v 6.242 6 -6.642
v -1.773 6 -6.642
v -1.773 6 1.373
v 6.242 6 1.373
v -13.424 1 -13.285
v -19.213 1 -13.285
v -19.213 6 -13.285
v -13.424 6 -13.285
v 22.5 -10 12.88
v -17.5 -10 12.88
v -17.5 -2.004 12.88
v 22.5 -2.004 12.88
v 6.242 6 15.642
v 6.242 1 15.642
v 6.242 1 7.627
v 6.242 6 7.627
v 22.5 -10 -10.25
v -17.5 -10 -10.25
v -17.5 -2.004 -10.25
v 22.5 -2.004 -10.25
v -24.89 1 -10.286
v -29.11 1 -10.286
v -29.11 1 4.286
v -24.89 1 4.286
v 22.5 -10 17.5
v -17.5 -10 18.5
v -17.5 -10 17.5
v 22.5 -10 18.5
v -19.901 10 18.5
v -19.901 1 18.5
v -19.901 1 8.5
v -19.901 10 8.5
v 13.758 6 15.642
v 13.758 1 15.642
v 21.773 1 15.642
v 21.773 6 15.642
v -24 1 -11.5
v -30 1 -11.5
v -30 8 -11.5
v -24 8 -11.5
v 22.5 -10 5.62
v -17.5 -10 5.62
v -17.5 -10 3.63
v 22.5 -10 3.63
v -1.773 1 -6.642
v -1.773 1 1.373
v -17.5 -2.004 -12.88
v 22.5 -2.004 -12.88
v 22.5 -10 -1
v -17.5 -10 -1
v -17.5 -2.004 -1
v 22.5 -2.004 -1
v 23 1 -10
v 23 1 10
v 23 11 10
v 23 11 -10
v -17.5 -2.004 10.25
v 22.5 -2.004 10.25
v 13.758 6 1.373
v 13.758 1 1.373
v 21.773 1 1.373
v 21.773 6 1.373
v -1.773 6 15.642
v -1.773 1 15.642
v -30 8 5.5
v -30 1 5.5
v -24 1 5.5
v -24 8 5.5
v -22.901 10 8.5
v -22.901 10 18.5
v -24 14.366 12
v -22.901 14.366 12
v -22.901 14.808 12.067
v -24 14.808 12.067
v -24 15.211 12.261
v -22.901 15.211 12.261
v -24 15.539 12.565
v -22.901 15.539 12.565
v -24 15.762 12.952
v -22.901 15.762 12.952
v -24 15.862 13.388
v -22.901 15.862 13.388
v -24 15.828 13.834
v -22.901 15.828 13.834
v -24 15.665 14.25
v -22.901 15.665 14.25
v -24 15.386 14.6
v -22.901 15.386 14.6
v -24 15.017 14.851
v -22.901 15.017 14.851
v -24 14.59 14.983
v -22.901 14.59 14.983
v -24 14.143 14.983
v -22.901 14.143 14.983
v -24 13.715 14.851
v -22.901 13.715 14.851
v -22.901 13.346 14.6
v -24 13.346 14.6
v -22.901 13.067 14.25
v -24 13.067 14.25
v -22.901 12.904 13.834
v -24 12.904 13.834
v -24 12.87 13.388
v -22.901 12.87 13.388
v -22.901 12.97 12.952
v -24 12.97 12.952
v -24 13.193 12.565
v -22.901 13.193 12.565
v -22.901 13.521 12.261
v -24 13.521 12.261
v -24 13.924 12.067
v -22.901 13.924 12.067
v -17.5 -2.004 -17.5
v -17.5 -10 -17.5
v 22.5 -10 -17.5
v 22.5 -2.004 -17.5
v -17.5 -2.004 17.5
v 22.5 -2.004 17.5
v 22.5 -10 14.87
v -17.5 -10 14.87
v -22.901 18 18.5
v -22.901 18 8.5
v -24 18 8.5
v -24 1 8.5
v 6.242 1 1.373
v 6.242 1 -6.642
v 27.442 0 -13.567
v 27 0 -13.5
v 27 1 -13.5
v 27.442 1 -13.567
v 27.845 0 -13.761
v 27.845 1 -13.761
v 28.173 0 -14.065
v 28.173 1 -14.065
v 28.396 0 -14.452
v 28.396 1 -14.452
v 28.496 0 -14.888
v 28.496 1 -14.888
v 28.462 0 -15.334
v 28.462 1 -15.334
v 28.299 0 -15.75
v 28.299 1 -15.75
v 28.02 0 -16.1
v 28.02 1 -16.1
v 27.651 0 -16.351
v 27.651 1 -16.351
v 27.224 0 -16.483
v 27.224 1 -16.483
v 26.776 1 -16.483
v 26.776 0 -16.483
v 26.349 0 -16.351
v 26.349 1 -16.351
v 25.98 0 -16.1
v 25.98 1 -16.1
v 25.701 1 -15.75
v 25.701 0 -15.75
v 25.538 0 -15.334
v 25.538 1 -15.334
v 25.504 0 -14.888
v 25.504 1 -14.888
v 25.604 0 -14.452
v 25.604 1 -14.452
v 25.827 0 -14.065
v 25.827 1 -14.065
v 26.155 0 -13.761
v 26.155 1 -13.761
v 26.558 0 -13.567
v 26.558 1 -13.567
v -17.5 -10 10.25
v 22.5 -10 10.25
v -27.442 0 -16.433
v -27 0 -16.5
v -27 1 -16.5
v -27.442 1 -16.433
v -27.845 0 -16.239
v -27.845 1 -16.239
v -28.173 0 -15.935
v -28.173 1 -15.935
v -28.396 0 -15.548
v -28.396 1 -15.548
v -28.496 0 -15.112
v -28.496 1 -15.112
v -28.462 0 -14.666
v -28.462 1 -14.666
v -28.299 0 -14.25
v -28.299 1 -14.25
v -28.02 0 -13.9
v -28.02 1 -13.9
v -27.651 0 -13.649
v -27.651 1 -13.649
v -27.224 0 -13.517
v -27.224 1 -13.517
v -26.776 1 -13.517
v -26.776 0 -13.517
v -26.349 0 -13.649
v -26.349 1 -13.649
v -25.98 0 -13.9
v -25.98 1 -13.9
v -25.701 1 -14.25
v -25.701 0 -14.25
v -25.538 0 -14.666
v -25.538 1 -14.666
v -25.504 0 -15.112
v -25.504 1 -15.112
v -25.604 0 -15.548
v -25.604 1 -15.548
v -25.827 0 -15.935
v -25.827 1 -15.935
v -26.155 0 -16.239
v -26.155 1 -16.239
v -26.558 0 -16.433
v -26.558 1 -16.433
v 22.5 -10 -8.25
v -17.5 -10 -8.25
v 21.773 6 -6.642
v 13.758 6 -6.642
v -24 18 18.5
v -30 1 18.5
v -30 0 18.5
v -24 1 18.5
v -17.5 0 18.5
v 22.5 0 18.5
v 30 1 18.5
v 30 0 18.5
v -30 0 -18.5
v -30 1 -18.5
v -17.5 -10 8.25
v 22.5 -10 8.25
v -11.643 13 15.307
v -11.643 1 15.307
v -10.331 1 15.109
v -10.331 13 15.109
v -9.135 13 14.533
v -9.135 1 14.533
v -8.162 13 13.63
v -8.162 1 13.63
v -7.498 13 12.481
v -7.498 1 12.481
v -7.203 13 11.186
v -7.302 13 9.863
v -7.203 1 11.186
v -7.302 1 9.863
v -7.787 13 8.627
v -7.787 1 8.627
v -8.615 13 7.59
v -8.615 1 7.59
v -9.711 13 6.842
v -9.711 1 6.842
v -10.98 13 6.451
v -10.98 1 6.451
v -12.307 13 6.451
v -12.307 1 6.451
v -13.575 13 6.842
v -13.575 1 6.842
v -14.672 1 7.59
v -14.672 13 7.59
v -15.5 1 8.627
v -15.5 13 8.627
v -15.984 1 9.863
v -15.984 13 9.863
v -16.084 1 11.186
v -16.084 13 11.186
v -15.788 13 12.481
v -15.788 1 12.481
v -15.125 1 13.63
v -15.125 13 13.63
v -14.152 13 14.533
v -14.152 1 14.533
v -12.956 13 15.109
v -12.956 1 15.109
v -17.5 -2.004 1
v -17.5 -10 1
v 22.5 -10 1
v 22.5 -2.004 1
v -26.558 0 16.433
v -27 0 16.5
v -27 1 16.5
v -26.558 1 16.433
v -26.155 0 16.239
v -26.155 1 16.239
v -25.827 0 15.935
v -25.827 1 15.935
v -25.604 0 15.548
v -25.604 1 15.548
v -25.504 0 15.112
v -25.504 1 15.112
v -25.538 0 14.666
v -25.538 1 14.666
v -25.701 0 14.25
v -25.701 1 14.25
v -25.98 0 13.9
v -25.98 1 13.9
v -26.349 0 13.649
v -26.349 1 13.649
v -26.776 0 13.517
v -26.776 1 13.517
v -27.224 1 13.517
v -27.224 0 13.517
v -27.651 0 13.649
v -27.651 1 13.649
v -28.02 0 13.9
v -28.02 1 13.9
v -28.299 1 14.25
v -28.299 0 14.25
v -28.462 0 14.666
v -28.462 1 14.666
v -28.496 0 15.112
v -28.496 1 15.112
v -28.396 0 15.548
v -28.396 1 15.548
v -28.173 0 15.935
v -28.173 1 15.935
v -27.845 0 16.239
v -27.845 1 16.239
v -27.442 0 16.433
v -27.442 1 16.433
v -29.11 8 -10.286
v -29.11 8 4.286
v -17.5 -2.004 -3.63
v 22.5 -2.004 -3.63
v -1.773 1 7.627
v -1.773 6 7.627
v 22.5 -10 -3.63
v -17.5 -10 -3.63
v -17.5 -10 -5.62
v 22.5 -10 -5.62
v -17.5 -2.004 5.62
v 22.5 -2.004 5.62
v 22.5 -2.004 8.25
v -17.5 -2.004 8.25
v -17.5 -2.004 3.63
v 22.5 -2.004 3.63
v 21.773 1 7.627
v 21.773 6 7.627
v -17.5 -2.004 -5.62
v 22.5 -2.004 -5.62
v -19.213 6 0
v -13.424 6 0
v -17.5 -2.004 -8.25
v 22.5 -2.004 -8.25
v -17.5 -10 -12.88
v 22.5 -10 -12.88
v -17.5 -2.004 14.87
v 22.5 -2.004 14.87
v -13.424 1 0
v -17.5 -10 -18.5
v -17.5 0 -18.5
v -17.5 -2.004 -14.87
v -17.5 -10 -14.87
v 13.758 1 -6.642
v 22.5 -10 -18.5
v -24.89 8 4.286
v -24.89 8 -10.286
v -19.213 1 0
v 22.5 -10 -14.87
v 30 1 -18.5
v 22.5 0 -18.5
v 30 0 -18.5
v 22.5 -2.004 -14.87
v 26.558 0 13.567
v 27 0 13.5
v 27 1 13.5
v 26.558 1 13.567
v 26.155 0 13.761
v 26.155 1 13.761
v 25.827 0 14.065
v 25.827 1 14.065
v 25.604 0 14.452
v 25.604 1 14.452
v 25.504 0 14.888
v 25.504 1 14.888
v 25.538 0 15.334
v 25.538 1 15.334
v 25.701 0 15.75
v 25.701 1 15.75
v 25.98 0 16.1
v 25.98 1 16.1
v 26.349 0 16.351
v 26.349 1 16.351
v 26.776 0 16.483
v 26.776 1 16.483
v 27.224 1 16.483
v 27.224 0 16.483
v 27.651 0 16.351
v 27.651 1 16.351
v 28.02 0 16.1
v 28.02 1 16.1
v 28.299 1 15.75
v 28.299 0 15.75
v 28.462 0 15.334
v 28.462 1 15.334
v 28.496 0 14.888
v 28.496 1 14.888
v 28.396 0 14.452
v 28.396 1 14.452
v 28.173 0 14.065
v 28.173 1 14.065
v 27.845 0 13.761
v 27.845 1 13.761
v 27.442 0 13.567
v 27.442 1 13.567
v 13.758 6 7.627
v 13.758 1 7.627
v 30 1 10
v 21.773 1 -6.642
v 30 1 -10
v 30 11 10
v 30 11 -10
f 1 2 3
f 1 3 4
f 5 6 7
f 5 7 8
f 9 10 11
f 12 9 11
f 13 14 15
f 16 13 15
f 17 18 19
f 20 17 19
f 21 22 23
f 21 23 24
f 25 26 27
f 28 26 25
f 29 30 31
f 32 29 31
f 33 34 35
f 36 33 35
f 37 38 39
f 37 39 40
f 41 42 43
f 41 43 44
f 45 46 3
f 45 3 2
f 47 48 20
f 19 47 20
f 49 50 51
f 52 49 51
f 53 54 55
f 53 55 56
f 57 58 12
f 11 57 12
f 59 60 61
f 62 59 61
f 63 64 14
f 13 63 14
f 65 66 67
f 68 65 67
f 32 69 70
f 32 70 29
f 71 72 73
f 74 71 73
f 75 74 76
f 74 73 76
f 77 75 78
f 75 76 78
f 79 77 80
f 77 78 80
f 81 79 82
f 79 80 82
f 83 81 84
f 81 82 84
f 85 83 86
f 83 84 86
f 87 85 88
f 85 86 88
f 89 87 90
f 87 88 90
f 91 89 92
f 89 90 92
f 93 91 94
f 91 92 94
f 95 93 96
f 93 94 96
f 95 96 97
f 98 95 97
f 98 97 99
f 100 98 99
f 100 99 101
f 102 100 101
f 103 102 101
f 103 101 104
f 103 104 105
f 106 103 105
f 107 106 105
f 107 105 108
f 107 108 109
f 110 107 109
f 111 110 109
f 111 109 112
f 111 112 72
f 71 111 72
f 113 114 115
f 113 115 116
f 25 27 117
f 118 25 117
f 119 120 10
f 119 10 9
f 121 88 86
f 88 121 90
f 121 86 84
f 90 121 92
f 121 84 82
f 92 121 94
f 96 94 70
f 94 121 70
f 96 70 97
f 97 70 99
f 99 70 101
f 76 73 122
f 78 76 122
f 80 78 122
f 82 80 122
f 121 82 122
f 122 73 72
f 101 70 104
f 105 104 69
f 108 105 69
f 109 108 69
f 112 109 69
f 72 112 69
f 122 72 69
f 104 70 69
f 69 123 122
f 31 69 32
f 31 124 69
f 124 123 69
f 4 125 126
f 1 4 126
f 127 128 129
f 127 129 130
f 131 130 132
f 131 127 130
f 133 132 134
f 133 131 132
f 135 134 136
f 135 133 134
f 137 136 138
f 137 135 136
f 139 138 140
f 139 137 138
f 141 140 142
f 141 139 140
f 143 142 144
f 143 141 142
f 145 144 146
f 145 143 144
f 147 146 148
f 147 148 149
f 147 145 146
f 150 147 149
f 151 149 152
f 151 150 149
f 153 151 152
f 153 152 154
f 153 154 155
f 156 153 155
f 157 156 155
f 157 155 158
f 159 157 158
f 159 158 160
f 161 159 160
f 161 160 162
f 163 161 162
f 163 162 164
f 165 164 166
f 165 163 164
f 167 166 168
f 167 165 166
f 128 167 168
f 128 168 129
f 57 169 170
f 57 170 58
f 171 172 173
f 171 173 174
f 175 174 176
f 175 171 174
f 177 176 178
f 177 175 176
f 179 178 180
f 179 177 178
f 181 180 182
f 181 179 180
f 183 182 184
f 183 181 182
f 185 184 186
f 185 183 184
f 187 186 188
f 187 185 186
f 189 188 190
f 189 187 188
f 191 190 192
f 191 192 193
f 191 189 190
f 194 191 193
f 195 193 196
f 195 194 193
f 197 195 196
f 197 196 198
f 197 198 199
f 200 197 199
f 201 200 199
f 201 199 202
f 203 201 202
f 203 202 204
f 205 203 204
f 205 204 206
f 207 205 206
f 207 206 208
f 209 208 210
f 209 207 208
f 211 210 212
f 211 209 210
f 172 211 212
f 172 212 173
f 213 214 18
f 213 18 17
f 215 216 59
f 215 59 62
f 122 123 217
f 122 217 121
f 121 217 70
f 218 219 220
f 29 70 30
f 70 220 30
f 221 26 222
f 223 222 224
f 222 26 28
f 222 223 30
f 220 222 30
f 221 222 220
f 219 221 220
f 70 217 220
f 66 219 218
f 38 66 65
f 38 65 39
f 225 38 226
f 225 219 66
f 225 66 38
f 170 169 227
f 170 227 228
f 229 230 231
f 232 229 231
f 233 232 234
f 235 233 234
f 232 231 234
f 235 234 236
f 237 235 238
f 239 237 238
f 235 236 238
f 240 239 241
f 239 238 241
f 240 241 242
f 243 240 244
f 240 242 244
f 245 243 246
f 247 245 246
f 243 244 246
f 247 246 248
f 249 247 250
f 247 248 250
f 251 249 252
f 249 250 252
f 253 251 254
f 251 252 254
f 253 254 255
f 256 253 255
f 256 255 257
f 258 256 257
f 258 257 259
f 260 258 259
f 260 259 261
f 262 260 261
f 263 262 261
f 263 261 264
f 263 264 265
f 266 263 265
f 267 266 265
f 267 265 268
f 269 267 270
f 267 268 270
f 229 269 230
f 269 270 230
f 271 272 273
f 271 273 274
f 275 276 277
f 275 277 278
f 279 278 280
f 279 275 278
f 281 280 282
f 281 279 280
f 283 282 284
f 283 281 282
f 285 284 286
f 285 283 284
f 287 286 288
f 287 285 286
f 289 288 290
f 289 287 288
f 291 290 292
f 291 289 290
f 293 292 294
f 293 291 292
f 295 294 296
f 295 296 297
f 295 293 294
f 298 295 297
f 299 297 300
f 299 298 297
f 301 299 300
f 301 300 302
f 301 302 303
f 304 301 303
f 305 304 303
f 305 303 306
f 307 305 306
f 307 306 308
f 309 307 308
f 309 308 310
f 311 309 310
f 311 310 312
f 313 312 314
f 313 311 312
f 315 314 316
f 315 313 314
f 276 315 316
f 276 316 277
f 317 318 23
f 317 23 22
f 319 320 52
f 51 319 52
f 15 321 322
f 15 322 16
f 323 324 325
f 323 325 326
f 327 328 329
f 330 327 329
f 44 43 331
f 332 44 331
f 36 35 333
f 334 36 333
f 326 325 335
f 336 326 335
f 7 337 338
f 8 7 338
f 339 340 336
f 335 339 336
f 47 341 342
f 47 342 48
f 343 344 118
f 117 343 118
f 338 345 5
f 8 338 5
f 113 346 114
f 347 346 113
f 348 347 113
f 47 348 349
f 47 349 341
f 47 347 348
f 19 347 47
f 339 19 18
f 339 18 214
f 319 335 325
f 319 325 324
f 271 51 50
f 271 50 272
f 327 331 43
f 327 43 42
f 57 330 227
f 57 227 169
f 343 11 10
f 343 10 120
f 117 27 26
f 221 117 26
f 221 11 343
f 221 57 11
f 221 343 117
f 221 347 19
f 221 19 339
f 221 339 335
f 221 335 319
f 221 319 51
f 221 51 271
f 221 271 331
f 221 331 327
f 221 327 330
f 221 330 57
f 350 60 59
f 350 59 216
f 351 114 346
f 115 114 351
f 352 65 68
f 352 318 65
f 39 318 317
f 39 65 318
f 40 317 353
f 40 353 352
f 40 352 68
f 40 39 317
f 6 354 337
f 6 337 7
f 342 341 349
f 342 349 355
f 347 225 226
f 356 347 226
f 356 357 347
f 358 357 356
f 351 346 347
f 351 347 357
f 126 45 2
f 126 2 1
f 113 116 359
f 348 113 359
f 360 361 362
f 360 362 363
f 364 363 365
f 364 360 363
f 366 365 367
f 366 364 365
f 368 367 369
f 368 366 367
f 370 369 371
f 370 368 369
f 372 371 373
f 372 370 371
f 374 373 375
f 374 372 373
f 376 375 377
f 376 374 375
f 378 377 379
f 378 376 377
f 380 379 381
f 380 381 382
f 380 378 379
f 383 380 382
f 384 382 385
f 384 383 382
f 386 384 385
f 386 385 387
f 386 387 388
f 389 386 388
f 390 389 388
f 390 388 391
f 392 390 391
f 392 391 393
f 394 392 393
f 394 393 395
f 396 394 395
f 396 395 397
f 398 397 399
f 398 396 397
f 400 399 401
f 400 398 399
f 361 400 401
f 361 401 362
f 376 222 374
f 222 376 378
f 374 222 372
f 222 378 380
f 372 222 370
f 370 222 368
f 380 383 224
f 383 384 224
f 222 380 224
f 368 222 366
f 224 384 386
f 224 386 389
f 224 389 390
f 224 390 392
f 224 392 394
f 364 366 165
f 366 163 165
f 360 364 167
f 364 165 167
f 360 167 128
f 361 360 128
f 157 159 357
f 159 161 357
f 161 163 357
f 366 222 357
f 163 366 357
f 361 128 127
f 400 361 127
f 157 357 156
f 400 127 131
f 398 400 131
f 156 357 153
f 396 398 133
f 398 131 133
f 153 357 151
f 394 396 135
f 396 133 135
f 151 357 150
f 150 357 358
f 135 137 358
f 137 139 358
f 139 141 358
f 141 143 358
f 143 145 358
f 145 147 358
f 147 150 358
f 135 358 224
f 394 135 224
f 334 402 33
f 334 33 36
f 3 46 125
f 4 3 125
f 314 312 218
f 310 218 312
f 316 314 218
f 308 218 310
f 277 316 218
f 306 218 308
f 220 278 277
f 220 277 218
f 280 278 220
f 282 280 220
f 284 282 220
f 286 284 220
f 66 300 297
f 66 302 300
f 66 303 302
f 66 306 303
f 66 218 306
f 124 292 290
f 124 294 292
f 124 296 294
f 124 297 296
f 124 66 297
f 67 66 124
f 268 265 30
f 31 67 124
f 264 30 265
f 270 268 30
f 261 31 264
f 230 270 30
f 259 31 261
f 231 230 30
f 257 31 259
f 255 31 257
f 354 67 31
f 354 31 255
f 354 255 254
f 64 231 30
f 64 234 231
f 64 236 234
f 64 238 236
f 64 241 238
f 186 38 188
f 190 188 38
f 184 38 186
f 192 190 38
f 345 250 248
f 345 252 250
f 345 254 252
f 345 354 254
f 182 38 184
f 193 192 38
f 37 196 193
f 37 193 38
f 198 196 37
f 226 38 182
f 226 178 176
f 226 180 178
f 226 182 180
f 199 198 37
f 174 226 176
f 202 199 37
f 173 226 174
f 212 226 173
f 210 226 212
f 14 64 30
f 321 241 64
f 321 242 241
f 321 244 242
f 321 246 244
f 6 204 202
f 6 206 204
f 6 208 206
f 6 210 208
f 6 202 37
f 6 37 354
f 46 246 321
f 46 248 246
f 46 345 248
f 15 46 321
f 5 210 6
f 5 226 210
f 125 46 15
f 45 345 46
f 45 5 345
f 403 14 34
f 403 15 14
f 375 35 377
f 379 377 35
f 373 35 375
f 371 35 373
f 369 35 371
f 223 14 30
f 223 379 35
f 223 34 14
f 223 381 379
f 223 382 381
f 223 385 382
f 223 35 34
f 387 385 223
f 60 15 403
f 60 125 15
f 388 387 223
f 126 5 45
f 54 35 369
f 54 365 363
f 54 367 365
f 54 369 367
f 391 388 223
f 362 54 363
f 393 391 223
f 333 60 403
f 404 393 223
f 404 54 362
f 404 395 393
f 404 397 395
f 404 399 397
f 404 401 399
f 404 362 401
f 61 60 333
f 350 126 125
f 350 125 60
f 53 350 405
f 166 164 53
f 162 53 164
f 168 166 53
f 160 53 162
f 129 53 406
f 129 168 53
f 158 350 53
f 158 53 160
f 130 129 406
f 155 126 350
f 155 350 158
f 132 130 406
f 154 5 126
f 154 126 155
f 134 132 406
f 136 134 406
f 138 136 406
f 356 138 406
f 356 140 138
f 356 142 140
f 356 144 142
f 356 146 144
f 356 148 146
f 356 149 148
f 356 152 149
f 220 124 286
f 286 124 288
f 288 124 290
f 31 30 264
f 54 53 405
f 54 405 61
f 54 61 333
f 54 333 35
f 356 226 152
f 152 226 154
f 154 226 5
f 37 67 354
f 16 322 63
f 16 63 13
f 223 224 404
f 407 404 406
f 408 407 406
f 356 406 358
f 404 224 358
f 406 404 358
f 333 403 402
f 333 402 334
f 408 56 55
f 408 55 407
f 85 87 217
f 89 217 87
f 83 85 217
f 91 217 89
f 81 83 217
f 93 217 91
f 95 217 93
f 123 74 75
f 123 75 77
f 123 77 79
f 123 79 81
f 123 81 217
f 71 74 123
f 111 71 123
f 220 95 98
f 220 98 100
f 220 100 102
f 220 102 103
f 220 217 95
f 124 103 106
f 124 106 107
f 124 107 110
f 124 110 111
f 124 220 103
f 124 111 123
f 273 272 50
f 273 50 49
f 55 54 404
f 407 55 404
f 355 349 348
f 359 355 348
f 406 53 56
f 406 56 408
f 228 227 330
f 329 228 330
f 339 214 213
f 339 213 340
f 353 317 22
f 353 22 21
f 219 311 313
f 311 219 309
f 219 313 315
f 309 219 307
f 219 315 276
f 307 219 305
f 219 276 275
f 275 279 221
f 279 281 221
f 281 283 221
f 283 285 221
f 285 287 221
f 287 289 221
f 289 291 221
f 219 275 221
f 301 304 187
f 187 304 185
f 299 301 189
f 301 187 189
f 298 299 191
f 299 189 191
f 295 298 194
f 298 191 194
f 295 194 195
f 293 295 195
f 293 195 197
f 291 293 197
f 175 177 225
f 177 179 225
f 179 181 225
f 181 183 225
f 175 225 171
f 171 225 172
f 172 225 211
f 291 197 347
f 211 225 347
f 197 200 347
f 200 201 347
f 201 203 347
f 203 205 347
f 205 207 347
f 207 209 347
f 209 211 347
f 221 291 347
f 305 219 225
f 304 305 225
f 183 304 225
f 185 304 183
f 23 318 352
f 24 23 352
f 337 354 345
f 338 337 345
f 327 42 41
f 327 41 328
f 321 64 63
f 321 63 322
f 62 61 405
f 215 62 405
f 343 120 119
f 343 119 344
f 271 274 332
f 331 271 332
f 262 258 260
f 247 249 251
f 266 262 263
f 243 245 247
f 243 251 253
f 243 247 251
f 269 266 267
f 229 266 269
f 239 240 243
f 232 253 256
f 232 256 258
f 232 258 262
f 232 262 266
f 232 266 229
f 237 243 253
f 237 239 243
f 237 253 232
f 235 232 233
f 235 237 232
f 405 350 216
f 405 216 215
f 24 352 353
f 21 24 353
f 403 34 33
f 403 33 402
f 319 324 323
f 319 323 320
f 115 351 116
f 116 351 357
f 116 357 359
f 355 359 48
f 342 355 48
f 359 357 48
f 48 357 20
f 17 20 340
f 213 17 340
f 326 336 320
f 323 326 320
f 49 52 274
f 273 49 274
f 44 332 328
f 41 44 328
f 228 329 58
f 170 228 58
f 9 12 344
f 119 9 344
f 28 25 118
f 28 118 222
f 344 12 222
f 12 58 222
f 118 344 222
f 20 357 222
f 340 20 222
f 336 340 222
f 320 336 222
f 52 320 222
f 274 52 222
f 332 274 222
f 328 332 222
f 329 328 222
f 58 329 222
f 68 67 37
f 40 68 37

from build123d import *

# Parameters (mm, degrees)
SKETCH_1_W          = 60
SKETCH_1_H          = 37
SKETCH_1_R          = 1.5
EXTRUDE_1_DEPTH     = 1
SKETCH_2_W          = 18
SKETCH_2_H          = 20
EXTRUDE_2_DEPTH     = 10
SKETCH_3_R          = 1
CUT_EXTRUDE_1_DEPTH = 1
SKETCH_4_W          = 1.889309118
SKETCH_4_H          = 3.828785833
CUT_EXTRUDE_2_DEPTH = 5
SKETCH_5_W          = 6
SKETCH_5_H          = 17
EXTRUDE_3_DEPTH     = 7
SKETCH_6_W          = 4.219200818
SKETCH_6_H          = 14.571651166
CUT_EXTRUDE_3_DEPTH = 7
SKETCH_7_W          = 1.099481737
SKETCH_7_H          = 10
EXTRUDE_4_DEPTH     = 17
SKETCH_8_W          = 3
SKETCH_8_H          = 10
EXTRUDE_5_DEPTH     = 9
SKETCH_9_R          = 1.5
CUT_EXTRUDE_4_DEPTH = 9
SKETCH_10_W         = 8.015050441
SKETCH_10_H         = 8.015050442
SKETCH_10_W_2       = 5.788647541
SKETCH_10_H_2       = 13.284723362
EXTRUDE_7_DEPTH     = 5
SKETCH_11_R         = 4.452805801
EXTRUDE_8_DEPTH     = 12
SKETCH_12_W         = 40
SKETCH_12_H         = 37
EXTRUDE_9_DEPTH     = 10
SKETCH_13_W         = 2.63
SKETCH_13_H         = 7.995738943
CUT_EXTRUDE_5_DEPTH = 64.941379403
SKETCH_14_W         = 11
SKETCH_14_H         = 20
CUT_EXTRUDE_6_DEPTH = 49.448426187


with BuildPart() as part:
    # 草图1 → 凸台-拉伸1 (new body)
    with BuildSketch(Plane(origin=(0, 0, 0), x_dir=(1, 0, 0), z_dir=(0, 1, 0))):
        Rectangle(SKETCH_1_W, SKETCH_1_H)
        with Locations(Location((27, 15, 0), (0, 0, 270))):
            Circle(SKETCH_1_R, mode=Mode.SUBTRACT)
        with Locations(Location((27, -15, 0), (0, 0, 90))):
            Circle(SKETCH_1_R, mode=Mode.SUBTRACT)
        with Locations(Location((-27, -15, 0), (0, 0, 270))):
            Circle(SKETCH_1_R, mode=Mode.SUBTRACT)
        with Locations(Location((-27, 15, 0), (0, 0, 90))):
            Circle(SKETCH_1_R, mode=Mode.SUBTRACT)
    extrude(amount=EXTRUDE_1_DEPTH)

    # 草图2 → 凸台-拉伸2 (add)
    with BuildSketch(Plane(origin=(0, 1, 0), x_dir=(1, 0, 0), z_dir=(0, 1, 0))):
        with Locations((32, 0)):
            Rectangle(SKETCH_2_W, SKETCH_2_H)
    extrude(amount=EXTRUDE_2_DEPTH)

    # 草图3 → 切除-拉伸1 (cut)
    with BuildSketch(Plane(origin=(0, 11, 0), x_dir=(1, 0, 0), z_dir=(0, 1, 0))):
        with Locations(Location((38.562083072, 7.5, 0), (0, 0, 270))):
            Circle(SKETCH_3_R)
        with Locations(Location((38.562083072, 2.5, 0), (0, 0, 270))):
            Circle(SKETCH_3_R)
        with Locations(Location((38.562083072, -7.5, 0), (0, 0, 90))):
            Circle(SKETCH_3_R)
        with Locations(Location((38.562083072, -2.5, 0), (0, 0, 90))):
            Circle(SKETCH_3_R)
    extrude(amount=-CUT_EXTRUDE_1_DEPTH, mode=Mode.SUBTRACT)

    # 草图4 → 切除-拉伸2 (cut)
    with BuildSketch(Plane(origin=(41, 0, 0), x_dir=(0, 0, -1), z_dir=(1, 0, 0))):
        with Locations((-2.5, 3.73063685)):
            Rectangle(SKETCH_4_W, SKETCH_4_H)
        with Locations((-7.5, 3.73063685)):
            Rectangle(SKETCH_4_W, SKETCH_4_H)
        with Locations((2.5, 3.73063685)):
            Rectangle(SKETCH_4_W, SKETCH_4_H)
        with Locations((7.5, 3.73063685)):
            Rectangle(SKETCH_4_W, SKETCH_4_H)
    extrude(amount=-CUT_EXTRUDE_2_DEPTH, mode=Mode.SUBTRACT)

    # 草图5 → 凸台-拉伸3 (add)
    with BuildSketch(Plane(origin=(0, 1, 0), x_dir=(1, 0, 0), z_dir=(0, 1, 0))):
        with Locations((-27, 3)):
            Rectangle(SKETCH_5_W, SKETCH_5_H)
    extrude(amount=EXTRUDE_3_DEPTH)

    # 草图6 → 切除-拉伸3 (cut)
    with BuildSketch(Plane(origin=(0, 8, 0), x_dir=(1, 0, 0), z_dir=(0, 1, 0))):
        with Locations((-27, 3)):
            Rectangle(SKETCH_6_W, SKETCH_6_H)
    extrude(amount=-CUT_EXTRUDE_3_DEPTH, mode=Mode.SUBTRACT)

    # 草图7 → 凸台-拉伸4 (add)
    with BuildSketch(Plane(origin=(0, 1, 0), x_dir=(1, 0, 0), z_dir=(0, 1, 0))):
        with Locations((-23.450259132, -13.5)):
            Rectangle(SKETCH_7_W, SKETCH_7_H)
    extrude(amount=EXTRUDE_4_DEPTH)

    # 草图8 → 凸台-拉伸5 (add)
    with BuildSketch(Plane(origin=(0, 1, 0), x_dir=(1, 0, 0), z_dir=(0, 1, 0))):
        with Locations((-21.400518263, -13.5)):
            Rectangle(SKETCH_8_W, SKETCH_8_H)
    extrude(amount=EXTRUDE_5_DEPTH)

    # 草图9 → 切除-拉伸4 (cut)
    with BuildSketch(Plane(origin=(-22.900518263, 0, 0), x_dir=(0, 0, -1), z_dir=(1, 0, 0))):
        with Locations((-13.5, 14.366101357)):
            Circle(SKETCH_9_R)
    extrude(amount=-CUT_EXTRUDE_4_DEPTH, mode=Mode.SUBTRACT)

    # 草图10 → 凸台-拉伸7 (add)
    with BuildSketch(Plane(origin=(0, 1, 0), x_dir=(1, 0, 0), z_dir=(0, 1, 0))):
        with Locations((2.23408969, 2.63483646)):
            Rectangle(SKETCH_10_W, SKETCH_10_H)
        with Locations((-16.318748425, 6.642361681)):
            Rectangle(SKETCH_10_W_2, SKETCH_10_H_2)
        with Locations((17.76591031, 2.63483646)):
            Rectangle(SKETCH_10_W, SKETCH_10_H)
        with Locations((17.76591031, -11.63483646)):
            Rectangle(SKETCH_10_W, SKETCH_10_H)
        with Locations((2.23408969, -11.63483646)):
            Rectangle(SKETCH_10_W, SKETCH_10_H)
    extrude(amount=EXTRUDE_7_DEPTH)

    # 草图11 → 凸台-拉伸8 (add)
    with BuildSketch(Plane(origin=(0, 1, 0), x_dir=(1, 0, 0), z_dir=(0, 1, 0))):
        with Locations(Location((-11.643302333, -10.85371414, 0), (0, 0, 270))):
            Circle(SKETCH_11_R)
    extrude(amount=EXTRUDE_8_DEPTH)

    # 草图12 → 凸台-拉伸9 (add)
    with BuildSketch(Plane.XZ):
        with Locations((2.5, 0)):
            Rectangle(SKETCH_12_W, SKETCH_12_H)
    extrude(amount=EXTRUDE_9_DEPTH)

    # 草图13 → 切除-拉伸5 (cut, through all)
    with BuildSketch(Plane.ZY.offset(17.5)):
        with Locations((-16.185, -6.002130529)):
            Rectangle(SKETCH_13_W, SKETCH_13_H)
        with Locations((-11.565, -6.002130529)):
            Rectangle(SKETCH_13_W, SKETCH_13_H)
        with Locations((-6.935, -6.002130529)):
            Rectangle(SKETCH_13_W, SKETCH_13_H)
        with Locations((-2.315, -6.002130529)):
            Rectangle(SKETCH_13_W, SKETCH_13_H)
        with Locations((2.315, -6.002130529)):
            Rectangle(SKETCH_13_W, SKETCH_13_H)
        with Locations((6.935, -6.002130529)):
            Rectangle(SKETCH_13_W, SKETCH_13_H)
        with Locations((11.565, -6.002130529)):
            Rectangle(SKETCH_13_W, SKETCH_13_H)
        with Locations((16.185, -6.002130529)):
            Rectangle(SKETCH_13_W, SKETCH_13_H)
    extrude(amount=-CUT_EXTRUDE_5_DEPTH, mode=Mode.SUBTRACT)

    # 草图14 → 切除-拉伸6 (cut, through all)
    with BuildSketch(Plane.XZ):
        with Locations((35.5, 0)):
            Rectangle(SKETCH_14_W, SKETCH_14_H)
    extrude(amount=-CUT_EXTRUDE_6_DEPTH, mode=Mode.SUBTRACT)


solid = part.part
